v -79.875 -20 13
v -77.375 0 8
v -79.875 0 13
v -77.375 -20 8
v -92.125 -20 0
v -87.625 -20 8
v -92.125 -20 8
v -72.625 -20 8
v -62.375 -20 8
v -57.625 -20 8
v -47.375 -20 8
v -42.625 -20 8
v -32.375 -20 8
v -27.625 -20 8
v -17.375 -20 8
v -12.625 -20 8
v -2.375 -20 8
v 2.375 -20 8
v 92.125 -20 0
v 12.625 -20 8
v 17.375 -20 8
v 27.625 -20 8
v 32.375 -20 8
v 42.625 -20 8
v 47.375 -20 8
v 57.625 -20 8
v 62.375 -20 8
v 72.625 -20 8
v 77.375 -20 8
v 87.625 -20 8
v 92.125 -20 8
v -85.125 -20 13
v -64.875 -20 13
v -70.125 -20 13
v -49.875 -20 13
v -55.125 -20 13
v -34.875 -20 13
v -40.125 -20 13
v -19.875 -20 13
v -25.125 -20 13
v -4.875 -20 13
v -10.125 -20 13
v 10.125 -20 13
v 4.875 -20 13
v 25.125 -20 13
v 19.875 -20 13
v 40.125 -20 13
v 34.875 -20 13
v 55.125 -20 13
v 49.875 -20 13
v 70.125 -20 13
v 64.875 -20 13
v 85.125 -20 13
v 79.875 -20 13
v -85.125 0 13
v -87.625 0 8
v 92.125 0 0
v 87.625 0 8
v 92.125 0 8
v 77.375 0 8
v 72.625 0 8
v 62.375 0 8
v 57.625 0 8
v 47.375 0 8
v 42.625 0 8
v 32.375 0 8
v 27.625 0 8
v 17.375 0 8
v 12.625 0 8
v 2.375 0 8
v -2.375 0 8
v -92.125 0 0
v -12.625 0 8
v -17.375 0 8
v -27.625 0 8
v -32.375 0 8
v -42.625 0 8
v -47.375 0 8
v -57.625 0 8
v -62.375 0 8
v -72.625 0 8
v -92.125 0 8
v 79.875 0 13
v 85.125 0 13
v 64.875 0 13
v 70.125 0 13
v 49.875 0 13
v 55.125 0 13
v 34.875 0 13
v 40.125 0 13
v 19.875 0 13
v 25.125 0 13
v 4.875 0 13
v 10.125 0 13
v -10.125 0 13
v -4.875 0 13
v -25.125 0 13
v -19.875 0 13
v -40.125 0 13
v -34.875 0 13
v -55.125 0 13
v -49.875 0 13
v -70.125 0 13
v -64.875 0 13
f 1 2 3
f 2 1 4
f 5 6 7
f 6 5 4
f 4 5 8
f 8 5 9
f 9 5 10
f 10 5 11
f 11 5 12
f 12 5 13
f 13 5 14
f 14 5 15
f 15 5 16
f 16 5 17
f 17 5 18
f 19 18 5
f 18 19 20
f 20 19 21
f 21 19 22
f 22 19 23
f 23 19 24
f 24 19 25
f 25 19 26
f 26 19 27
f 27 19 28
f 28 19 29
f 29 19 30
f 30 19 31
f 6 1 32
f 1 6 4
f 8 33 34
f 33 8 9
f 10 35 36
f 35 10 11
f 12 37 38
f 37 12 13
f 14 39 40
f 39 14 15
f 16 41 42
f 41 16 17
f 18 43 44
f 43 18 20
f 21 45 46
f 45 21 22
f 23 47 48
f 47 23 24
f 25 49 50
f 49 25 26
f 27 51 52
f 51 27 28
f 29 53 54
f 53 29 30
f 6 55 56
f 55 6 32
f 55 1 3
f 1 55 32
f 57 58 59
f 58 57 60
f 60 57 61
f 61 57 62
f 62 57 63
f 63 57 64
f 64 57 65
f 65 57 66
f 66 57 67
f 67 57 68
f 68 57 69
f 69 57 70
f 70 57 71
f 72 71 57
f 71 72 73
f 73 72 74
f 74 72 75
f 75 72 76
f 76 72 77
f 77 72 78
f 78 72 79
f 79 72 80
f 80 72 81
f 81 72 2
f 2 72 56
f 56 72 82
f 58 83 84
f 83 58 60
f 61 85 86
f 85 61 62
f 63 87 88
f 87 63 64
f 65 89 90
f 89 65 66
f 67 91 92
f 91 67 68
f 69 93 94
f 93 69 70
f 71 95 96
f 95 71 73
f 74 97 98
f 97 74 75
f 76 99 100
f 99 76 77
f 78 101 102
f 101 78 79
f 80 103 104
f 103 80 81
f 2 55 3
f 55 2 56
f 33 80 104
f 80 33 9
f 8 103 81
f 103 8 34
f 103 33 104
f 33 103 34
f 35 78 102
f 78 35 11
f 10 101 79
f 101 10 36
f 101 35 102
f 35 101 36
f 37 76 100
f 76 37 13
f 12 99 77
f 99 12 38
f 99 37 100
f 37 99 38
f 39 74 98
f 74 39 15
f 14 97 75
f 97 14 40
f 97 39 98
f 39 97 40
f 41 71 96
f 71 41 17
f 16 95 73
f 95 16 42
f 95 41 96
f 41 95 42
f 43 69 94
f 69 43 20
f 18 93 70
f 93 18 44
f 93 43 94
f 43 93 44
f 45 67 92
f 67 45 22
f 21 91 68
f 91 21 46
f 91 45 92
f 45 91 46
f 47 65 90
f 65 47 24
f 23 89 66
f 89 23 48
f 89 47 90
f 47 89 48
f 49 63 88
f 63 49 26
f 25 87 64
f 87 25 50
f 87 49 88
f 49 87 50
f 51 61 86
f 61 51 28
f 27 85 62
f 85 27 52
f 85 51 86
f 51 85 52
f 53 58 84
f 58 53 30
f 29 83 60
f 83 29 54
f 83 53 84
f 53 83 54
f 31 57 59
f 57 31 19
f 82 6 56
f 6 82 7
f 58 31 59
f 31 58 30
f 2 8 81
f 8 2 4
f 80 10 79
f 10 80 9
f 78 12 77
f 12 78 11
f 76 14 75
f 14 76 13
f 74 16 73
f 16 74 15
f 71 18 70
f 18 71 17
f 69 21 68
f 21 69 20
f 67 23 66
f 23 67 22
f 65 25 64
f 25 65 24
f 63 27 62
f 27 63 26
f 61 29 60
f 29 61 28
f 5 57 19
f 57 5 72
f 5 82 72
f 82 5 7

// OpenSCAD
$fn = 32;

// ----------------------------------------------------------------------
// Toothed rack, 12 teeth
// 15 mm pitch, 5 mm teeth
// ----------------------------------------------------------------------

// --- parameters (mm) ---
bar_w = 20;      // bar width (Y)
bar_h = 8;       // bar height (Z)
teeth = 12;      // number of teeth
pitch = 15;      // tooth pitch
tooth_h = 5;     // tooth height above the bar
root_w = 11.25;  // tooth width at the root
crest_w = 5.25;  // tooth width at the crest

// --- derived feature positions (mm) ---
span = (teeth - 1) * pitch;  // = 165   distance between the outer teeth
bar_l = span + root_w + 8;   // = 184.25   bar length: teeth plus 4 mm at each end
tooth_x = -span / 2;         // = -82.5   X of the first tooth
height = bar_h + tooth_h;    // = 13   overall height
feature_centers = [
  [tooth_x + 0 * pitch, -bar_w / 2],
  [tooth_x + 1 * pitch, -bar_w / 2],
  [tooth_x + 2 * pitch, -bar_w / 2],
  [tooth_x + 3 * pitch, -bar_w / 2],
  [tooth_x + 4 * pitch, -bar_w / 2],
  [tooth_x + 5 * pitch, -bar_w / 2],
  [tooth_x + 6 * pitch, -bar_w / 2],
  [tooth_x + 7 * pitch, -bar_w / 2],
  [tooth_x + 8 * pitch, -bar_w / 2],
  [tooth_x + 9 * pitch, -bar_w / 2],
  [tooth_x + 10 * pitch, -bar_w / 2],
  [tooth_x + 11 * pitch, -bar_w / 2]
];   // tooth centre line, drives the tooth loop

// bar with a rack of teeth, one extruded trapezoium per centre
module rack_tooth() {
  linear_extrude(height = bar_w)
    polygon(points = [
      [0, 0],
      [root_w, 0],
      [root_w / 2 + crest_w / 2, tooth_h + 1],
      [root_w / 2 - crest_w / 2, tooth_h + 1]
    ]);
}

union() {
  translate([-bar_l / 2, -bar_w, 0]) cube([bar_l, bar_w, bar_h]);
  for (centre = feature_centers)
    translate([centre[0] - root_w / 2, 0, bar_h - 1]) rotate([90, 0, 0]) rack_tooth();
}
